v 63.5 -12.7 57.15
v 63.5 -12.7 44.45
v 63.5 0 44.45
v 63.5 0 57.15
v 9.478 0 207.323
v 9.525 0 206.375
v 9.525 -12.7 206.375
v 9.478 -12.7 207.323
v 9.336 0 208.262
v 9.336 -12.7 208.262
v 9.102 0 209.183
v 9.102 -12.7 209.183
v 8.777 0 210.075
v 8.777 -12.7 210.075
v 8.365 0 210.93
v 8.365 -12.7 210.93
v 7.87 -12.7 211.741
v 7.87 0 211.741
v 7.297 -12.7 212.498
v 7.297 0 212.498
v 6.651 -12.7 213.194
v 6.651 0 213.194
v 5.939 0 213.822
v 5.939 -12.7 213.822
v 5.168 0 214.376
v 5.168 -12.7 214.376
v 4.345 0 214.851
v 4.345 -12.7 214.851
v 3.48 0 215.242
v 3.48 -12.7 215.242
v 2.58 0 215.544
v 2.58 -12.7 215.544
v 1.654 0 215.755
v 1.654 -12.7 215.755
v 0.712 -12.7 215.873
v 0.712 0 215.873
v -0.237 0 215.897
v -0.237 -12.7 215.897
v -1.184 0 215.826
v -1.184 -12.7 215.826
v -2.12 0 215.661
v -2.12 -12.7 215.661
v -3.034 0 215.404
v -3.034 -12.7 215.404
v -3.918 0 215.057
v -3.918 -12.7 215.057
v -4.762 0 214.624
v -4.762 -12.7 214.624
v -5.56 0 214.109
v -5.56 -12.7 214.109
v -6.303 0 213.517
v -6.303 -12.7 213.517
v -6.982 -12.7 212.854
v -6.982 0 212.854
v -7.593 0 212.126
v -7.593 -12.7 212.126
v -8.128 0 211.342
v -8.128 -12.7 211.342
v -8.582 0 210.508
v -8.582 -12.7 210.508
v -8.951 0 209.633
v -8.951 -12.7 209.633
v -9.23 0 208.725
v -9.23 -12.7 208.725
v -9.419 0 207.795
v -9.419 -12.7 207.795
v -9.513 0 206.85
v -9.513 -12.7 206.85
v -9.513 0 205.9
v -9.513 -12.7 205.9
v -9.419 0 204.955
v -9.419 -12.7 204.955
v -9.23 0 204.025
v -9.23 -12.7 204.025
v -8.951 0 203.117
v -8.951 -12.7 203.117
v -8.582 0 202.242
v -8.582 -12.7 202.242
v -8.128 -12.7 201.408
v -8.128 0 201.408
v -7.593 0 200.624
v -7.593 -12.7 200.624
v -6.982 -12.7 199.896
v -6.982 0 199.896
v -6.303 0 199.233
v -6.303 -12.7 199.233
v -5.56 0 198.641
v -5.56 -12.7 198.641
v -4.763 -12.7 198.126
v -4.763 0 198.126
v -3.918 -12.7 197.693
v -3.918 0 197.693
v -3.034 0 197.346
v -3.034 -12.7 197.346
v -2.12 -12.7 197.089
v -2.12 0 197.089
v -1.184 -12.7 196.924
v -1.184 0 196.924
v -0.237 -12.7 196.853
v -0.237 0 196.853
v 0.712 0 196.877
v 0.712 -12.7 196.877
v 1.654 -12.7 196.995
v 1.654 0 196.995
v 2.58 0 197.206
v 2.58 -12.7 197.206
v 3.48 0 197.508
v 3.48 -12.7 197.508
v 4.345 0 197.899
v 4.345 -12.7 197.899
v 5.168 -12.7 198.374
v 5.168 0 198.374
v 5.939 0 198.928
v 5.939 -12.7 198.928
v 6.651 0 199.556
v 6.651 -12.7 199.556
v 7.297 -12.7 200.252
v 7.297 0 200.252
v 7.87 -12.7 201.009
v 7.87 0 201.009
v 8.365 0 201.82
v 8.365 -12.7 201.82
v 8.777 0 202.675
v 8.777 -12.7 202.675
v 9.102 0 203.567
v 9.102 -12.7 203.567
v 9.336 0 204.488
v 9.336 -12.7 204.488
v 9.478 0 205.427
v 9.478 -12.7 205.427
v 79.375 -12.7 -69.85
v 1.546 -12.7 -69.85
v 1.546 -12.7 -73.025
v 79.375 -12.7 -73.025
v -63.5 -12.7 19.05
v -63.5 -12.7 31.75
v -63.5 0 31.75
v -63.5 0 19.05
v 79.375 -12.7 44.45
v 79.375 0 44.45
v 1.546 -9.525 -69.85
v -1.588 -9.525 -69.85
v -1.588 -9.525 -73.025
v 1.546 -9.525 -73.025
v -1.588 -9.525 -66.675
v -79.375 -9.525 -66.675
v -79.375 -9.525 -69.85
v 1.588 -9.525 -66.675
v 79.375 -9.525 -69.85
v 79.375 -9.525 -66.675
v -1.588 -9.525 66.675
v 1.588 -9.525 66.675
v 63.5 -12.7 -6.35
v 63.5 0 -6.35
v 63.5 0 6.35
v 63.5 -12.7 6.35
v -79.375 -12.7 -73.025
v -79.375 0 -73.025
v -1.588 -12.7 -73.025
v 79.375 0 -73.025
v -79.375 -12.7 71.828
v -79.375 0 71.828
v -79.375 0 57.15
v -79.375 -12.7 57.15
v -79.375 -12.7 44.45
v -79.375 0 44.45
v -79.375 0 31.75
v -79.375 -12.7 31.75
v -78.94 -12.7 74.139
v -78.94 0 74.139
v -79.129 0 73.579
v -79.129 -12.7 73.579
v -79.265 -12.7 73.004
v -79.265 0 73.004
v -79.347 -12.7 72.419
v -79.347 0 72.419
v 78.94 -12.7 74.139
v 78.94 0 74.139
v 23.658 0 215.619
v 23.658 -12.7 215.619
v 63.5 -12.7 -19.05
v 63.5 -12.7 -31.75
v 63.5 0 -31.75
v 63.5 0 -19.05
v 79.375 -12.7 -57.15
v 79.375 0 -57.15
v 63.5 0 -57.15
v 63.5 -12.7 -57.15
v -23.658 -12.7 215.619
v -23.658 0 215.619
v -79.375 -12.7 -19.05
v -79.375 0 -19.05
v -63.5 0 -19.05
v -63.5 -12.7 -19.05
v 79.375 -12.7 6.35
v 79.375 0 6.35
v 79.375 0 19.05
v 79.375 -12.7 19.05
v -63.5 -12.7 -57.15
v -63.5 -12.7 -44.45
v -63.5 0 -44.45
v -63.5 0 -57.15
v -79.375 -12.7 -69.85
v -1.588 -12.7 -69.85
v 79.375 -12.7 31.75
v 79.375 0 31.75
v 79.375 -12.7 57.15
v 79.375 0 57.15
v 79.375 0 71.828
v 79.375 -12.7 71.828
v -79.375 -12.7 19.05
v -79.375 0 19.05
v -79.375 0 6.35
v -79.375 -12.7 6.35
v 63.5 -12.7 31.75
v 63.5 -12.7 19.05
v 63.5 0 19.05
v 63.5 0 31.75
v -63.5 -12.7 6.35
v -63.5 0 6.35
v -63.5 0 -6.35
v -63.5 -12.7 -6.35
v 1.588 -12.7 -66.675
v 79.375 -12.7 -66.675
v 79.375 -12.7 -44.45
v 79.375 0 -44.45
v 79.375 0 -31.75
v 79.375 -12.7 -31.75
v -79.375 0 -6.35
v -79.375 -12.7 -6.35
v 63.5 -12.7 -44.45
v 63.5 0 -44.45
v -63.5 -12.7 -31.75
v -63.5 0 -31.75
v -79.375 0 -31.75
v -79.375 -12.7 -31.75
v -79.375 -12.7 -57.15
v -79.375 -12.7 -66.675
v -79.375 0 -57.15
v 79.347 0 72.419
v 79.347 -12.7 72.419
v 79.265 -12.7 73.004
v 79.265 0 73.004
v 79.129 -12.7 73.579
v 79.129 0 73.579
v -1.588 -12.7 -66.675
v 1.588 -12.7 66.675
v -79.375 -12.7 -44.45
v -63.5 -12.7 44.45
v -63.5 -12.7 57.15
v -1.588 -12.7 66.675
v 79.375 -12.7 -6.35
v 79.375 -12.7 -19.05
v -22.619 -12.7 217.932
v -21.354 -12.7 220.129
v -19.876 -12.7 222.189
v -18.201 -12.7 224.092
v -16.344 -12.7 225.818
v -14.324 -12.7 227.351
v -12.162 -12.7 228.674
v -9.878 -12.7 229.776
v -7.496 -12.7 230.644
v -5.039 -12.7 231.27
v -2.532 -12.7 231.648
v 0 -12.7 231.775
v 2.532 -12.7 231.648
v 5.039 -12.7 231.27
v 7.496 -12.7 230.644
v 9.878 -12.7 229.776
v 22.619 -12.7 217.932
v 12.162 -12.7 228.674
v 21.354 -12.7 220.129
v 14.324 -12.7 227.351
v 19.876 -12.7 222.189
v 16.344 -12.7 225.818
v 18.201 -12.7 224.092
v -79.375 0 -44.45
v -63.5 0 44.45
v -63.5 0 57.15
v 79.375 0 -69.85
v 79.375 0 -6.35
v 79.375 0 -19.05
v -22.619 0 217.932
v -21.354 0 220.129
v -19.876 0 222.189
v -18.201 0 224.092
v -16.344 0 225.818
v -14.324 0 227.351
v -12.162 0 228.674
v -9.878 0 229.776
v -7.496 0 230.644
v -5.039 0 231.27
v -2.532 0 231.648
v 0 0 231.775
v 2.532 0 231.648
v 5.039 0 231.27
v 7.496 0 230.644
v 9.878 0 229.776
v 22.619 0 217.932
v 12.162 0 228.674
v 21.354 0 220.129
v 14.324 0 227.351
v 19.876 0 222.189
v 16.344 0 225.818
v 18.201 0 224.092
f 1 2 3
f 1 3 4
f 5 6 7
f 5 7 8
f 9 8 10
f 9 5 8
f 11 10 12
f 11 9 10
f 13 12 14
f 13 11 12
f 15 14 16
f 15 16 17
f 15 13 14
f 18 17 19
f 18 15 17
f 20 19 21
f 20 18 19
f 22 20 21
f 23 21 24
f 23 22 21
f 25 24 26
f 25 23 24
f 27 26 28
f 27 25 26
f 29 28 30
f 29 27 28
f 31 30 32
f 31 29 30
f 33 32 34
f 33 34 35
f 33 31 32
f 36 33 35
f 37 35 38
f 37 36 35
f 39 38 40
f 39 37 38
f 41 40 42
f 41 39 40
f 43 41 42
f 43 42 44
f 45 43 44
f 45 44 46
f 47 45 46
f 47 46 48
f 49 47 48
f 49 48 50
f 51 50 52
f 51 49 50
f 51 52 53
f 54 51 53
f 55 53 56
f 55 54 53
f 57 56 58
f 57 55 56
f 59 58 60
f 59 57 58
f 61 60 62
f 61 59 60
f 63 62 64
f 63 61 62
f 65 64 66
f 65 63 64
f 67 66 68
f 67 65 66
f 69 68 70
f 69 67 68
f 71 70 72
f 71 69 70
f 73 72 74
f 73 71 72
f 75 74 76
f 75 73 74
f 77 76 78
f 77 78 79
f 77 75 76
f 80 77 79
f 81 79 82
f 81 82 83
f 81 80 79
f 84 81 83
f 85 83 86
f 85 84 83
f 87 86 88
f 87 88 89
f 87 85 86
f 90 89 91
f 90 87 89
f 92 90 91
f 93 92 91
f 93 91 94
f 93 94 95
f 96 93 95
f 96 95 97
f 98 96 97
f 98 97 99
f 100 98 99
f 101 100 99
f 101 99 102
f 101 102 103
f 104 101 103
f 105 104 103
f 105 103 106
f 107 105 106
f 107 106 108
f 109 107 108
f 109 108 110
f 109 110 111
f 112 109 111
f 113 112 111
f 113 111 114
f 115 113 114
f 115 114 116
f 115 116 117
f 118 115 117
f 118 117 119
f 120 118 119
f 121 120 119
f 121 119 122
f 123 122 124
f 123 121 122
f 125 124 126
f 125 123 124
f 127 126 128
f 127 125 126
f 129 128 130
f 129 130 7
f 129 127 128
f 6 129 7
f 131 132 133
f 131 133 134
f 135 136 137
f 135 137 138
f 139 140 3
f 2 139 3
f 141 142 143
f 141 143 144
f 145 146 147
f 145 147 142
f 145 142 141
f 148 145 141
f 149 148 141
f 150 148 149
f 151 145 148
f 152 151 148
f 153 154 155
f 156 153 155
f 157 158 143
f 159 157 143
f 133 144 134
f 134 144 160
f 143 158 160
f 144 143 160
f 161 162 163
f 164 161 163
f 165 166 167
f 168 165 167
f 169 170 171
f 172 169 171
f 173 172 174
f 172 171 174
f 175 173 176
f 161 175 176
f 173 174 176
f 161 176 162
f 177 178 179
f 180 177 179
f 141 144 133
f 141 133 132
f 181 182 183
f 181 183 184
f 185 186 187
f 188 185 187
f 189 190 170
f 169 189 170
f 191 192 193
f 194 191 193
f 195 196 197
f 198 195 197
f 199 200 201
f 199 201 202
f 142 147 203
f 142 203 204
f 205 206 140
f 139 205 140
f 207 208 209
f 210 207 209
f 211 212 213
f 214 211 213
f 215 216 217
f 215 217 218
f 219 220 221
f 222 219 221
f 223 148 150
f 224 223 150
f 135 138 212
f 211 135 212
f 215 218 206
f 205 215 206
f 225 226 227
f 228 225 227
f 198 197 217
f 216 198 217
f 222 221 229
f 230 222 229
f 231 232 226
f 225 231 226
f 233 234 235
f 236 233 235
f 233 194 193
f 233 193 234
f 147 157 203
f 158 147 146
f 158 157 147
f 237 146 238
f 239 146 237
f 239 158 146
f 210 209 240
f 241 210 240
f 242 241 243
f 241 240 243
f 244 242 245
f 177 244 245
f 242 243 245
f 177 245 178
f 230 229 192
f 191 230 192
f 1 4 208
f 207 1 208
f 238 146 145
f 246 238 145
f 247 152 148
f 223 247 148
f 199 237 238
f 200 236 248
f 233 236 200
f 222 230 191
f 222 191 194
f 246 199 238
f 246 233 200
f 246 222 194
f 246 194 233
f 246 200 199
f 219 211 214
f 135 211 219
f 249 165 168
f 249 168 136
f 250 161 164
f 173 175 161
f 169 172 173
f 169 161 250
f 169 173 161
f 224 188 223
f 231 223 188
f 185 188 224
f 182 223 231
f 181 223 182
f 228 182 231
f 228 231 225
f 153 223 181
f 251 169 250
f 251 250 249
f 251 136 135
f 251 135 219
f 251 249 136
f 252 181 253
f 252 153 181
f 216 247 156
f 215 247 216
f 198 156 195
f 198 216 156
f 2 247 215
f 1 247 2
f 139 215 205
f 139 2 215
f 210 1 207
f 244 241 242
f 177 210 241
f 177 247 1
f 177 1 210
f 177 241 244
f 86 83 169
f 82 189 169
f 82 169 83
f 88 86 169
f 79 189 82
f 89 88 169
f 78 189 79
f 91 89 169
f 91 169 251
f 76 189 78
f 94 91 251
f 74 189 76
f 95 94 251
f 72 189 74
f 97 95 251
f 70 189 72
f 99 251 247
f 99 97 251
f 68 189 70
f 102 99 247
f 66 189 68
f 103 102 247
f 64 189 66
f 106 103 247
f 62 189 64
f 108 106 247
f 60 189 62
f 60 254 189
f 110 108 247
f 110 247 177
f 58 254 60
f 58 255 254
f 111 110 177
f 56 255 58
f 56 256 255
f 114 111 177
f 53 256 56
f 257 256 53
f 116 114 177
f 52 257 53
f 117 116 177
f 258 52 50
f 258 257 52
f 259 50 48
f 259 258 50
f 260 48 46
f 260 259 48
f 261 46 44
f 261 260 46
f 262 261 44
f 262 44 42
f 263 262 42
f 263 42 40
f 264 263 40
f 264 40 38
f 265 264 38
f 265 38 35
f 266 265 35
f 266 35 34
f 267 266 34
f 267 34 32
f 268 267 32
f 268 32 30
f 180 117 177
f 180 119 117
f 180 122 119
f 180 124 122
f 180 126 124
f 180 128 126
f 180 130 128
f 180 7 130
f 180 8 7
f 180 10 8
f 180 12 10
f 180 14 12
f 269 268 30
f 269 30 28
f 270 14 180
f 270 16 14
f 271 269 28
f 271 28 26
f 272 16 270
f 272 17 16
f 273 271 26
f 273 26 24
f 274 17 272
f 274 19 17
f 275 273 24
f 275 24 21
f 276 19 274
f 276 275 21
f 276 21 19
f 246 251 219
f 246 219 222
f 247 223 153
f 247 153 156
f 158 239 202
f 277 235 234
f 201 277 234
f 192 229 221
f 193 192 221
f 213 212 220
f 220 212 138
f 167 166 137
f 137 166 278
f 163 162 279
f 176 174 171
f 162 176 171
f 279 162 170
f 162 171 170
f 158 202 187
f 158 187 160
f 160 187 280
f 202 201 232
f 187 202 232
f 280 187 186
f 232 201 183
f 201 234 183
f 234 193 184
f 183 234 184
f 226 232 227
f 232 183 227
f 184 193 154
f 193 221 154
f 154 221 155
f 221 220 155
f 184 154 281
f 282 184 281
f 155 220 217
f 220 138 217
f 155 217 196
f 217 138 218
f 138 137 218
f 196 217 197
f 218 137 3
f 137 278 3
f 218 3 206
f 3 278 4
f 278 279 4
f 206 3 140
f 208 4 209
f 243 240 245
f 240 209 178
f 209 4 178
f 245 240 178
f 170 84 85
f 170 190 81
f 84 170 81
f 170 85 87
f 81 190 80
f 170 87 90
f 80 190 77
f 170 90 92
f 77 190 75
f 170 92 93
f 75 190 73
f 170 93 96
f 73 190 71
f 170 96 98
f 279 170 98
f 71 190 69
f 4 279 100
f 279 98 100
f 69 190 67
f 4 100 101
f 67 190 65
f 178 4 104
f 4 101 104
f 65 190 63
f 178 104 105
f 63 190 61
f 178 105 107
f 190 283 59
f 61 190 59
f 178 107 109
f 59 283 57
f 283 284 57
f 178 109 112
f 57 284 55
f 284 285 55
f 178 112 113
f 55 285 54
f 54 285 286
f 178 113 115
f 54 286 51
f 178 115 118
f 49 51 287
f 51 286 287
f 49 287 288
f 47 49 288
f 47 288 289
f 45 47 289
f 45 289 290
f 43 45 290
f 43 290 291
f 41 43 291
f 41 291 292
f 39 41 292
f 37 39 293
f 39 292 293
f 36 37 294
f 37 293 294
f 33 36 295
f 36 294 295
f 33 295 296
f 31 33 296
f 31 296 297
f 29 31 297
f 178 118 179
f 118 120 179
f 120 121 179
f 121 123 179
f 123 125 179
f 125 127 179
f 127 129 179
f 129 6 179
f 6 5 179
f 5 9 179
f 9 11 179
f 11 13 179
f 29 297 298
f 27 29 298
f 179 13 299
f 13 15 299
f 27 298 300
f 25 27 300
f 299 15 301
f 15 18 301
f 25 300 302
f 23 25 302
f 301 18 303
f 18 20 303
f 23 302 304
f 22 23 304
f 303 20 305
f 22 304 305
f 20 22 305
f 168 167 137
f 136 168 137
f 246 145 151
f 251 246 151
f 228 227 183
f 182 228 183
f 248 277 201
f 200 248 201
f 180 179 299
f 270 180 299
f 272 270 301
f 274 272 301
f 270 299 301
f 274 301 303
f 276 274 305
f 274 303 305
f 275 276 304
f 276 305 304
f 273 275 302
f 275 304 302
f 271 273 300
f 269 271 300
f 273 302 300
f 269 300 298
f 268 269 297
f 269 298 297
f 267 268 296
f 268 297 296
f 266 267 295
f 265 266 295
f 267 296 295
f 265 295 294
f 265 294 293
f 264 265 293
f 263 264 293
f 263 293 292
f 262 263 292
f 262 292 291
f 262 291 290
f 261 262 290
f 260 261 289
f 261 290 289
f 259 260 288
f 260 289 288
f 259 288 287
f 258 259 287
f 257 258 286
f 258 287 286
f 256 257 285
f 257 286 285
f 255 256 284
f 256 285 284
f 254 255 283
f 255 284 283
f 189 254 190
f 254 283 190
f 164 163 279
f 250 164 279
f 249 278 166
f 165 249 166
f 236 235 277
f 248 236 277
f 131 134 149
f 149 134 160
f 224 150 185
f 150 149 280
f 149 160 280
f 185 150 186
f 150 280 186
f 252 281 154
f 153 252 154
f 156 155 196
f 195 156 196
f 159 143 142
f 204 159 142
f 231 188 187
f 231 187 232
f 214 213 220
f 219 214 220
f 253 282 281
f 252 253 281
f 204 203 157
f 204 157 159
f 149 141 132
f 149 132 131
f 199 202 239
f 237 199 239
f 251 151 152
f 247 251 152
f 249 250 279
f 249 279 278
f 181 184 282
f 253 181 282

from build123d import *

# Parameters (mm, degrees)
F1_DEPTH = 9.525
F0_W     = 77.7875
F0_H     = 3.175
F0_W_2   = 77.8286574921
F0_R     = 9.525
F2_DEPTH = 12.7


with BuildPart() as f1:
    # F0 (on Front) → F1 (new body)
    with BuildSketch(Plane.XZ):
        Polygon((-1.5875, -69.85), (-1.5875, -73.025), (1.5463425079, -73.025), (1.5463425079, -69.85), (79.375, -69.85), (79.375, -66.675), (1.5875, -66.675), (1.5875, 66.675), (-1.5875, 66.675), (-1.5875, -66.675), (-79.375, -66.675), (-79.375, -69.85), align=None)
    extrude(amount=F1_DEPTH)

    # F0 (on Front) → F2 (join)
    with BuildSketch(Plane.XZ):
        with Locations((-40.48125, -71.4375)):
            Rectangle(F0_W, F0_H)
        with Locations((40.460671254, -71.4375)):
            Rectangle(F0_W_2, F0_H)
        with BuildLine():
            Line((-79.375, -57.15), (-79.375, -66.675))
            Line((-79.375, -66.675), (-1.5875, -66.675))
            Line((-1.5875, -66.675), (-1.5875, 66.675))
            Line((-1.5875, 66.675), (1.5875, 66.675))
            Line((1.5875, 66.675), (1.5875, -66.675))
            Line((1.5875, -66.675), (79.375, -66.675))
            Line((79.375, -66.675), (79.375, -57.15))
            Line((79.375, -57.15), (63.5, -57.15))
            Line((63.5, -57.15), (63.5, -44.45))
            Line((63.5, -44.45), (79.375, -44.45))
            Line((79.375, -44.45), (79.375, -31.75))
            Line((79.375, -31.75), (63.5, -31.75))
            Line((63.5, -31.75), (63.5, -19.05))
            Line((63.5, -19.05), (79.375, -19.05))
            Line((79.375, -19.05), (79.375, -6.35))
            Line((79.375, -6.35), (63.5, -6.35))
            Line((63.5, -6.35), (63.5, 6.35))
            Line((63.5, 6.35), (79.375, 6.35))
            Line((79.375, 6.35), (79.375, 19.05))
            Line((79.375, 19.05), (63.5, 19.05))
            Line((63.5, 19.05), (63.5, 31.75))
            Line((63.5, 31.75), (79.375, 31.75))
            Line((79.375, 31.75), (79.375, 44.45))
            Line((79.375, 44.45), (63.5, 44.45))
            Line((63.5, 44.45), (63.5, 57.15))
            Line((63.5, 57.15), (79.375, 57.15))
            Line((79.375, 57.15), (79.375, 71.8284572224))
            ThreePointArc((79.375, 71.8284572224), (79.2651824968, 73.0043068755), (78.9395283758, 74.1394860175))
            Line((78.9395283758, 74.1394860175), (23.6581135032, 215.6191151805))
            ThreePointArc((23.6581135032, 215.6191151805), (0, 231.775), (-23.6581135032, 215.6191151805))
            Line((-23.6581135032, 215.6191151805), (-78.9395283758, 74.1394860175))
            ThreePointArc((-78.9395283758, 74.1394860175), (-79.2651824968, 73.0043068755), (-79.375, 71.8284572224))
            Line((-79.375, 71.8284572224), (-79.375, 57.15))
            Line((-79.375, 57.15), (-63.5, 57.15))
            Line((-63.5, 57.15), (-63.5, 44.45))
            Line((-63.5, 44.45), (-79.375, 44.45))
            Line((-79.375, 44.45), (-79.375, 31.75))
            Line((-79.375, 31.75), (-63.5, 31.75))
            Line((-63.5, 31.75), (-63.5, 19.05))
            Line((-63.5, 19.05), (-79.375, 19.05))
            Line((-79.375, 19.05), (-79.375, 6.35))
            Line((-79.375, 6.35), (-63.5, 6.35))
            Line((-63.5, 6.35), (-63.5, -6.35))
            Line((-63.5, -6.35), (-79.375, -6.35))
            Line((-79.375, -6.35), (-79.375, -19.05))
            Line((-79.375, -19.05), (-63.5, -19.05))
            Line((-63.5, -19.05), (-63.5, -31.75))
            Line((-63.5, -31.75), (-79.375, -31.75))
            Line((-79.375, -31.75), (-79.375, -44.45))
            Line((-79.375, -44.45), (-63.5, -44.45))
            Line((-63.5, -44.45), (-63.5, -57.15))
            Line((-63.5, -57.15), (-79.375, -57.15))
        make_face()
        with Locations((0, 206.375)):
            Circle(F0_R, mode=Mode.SUBTRACT)
    extrude(amount=F2_DEPTH)


solid = f1.part
